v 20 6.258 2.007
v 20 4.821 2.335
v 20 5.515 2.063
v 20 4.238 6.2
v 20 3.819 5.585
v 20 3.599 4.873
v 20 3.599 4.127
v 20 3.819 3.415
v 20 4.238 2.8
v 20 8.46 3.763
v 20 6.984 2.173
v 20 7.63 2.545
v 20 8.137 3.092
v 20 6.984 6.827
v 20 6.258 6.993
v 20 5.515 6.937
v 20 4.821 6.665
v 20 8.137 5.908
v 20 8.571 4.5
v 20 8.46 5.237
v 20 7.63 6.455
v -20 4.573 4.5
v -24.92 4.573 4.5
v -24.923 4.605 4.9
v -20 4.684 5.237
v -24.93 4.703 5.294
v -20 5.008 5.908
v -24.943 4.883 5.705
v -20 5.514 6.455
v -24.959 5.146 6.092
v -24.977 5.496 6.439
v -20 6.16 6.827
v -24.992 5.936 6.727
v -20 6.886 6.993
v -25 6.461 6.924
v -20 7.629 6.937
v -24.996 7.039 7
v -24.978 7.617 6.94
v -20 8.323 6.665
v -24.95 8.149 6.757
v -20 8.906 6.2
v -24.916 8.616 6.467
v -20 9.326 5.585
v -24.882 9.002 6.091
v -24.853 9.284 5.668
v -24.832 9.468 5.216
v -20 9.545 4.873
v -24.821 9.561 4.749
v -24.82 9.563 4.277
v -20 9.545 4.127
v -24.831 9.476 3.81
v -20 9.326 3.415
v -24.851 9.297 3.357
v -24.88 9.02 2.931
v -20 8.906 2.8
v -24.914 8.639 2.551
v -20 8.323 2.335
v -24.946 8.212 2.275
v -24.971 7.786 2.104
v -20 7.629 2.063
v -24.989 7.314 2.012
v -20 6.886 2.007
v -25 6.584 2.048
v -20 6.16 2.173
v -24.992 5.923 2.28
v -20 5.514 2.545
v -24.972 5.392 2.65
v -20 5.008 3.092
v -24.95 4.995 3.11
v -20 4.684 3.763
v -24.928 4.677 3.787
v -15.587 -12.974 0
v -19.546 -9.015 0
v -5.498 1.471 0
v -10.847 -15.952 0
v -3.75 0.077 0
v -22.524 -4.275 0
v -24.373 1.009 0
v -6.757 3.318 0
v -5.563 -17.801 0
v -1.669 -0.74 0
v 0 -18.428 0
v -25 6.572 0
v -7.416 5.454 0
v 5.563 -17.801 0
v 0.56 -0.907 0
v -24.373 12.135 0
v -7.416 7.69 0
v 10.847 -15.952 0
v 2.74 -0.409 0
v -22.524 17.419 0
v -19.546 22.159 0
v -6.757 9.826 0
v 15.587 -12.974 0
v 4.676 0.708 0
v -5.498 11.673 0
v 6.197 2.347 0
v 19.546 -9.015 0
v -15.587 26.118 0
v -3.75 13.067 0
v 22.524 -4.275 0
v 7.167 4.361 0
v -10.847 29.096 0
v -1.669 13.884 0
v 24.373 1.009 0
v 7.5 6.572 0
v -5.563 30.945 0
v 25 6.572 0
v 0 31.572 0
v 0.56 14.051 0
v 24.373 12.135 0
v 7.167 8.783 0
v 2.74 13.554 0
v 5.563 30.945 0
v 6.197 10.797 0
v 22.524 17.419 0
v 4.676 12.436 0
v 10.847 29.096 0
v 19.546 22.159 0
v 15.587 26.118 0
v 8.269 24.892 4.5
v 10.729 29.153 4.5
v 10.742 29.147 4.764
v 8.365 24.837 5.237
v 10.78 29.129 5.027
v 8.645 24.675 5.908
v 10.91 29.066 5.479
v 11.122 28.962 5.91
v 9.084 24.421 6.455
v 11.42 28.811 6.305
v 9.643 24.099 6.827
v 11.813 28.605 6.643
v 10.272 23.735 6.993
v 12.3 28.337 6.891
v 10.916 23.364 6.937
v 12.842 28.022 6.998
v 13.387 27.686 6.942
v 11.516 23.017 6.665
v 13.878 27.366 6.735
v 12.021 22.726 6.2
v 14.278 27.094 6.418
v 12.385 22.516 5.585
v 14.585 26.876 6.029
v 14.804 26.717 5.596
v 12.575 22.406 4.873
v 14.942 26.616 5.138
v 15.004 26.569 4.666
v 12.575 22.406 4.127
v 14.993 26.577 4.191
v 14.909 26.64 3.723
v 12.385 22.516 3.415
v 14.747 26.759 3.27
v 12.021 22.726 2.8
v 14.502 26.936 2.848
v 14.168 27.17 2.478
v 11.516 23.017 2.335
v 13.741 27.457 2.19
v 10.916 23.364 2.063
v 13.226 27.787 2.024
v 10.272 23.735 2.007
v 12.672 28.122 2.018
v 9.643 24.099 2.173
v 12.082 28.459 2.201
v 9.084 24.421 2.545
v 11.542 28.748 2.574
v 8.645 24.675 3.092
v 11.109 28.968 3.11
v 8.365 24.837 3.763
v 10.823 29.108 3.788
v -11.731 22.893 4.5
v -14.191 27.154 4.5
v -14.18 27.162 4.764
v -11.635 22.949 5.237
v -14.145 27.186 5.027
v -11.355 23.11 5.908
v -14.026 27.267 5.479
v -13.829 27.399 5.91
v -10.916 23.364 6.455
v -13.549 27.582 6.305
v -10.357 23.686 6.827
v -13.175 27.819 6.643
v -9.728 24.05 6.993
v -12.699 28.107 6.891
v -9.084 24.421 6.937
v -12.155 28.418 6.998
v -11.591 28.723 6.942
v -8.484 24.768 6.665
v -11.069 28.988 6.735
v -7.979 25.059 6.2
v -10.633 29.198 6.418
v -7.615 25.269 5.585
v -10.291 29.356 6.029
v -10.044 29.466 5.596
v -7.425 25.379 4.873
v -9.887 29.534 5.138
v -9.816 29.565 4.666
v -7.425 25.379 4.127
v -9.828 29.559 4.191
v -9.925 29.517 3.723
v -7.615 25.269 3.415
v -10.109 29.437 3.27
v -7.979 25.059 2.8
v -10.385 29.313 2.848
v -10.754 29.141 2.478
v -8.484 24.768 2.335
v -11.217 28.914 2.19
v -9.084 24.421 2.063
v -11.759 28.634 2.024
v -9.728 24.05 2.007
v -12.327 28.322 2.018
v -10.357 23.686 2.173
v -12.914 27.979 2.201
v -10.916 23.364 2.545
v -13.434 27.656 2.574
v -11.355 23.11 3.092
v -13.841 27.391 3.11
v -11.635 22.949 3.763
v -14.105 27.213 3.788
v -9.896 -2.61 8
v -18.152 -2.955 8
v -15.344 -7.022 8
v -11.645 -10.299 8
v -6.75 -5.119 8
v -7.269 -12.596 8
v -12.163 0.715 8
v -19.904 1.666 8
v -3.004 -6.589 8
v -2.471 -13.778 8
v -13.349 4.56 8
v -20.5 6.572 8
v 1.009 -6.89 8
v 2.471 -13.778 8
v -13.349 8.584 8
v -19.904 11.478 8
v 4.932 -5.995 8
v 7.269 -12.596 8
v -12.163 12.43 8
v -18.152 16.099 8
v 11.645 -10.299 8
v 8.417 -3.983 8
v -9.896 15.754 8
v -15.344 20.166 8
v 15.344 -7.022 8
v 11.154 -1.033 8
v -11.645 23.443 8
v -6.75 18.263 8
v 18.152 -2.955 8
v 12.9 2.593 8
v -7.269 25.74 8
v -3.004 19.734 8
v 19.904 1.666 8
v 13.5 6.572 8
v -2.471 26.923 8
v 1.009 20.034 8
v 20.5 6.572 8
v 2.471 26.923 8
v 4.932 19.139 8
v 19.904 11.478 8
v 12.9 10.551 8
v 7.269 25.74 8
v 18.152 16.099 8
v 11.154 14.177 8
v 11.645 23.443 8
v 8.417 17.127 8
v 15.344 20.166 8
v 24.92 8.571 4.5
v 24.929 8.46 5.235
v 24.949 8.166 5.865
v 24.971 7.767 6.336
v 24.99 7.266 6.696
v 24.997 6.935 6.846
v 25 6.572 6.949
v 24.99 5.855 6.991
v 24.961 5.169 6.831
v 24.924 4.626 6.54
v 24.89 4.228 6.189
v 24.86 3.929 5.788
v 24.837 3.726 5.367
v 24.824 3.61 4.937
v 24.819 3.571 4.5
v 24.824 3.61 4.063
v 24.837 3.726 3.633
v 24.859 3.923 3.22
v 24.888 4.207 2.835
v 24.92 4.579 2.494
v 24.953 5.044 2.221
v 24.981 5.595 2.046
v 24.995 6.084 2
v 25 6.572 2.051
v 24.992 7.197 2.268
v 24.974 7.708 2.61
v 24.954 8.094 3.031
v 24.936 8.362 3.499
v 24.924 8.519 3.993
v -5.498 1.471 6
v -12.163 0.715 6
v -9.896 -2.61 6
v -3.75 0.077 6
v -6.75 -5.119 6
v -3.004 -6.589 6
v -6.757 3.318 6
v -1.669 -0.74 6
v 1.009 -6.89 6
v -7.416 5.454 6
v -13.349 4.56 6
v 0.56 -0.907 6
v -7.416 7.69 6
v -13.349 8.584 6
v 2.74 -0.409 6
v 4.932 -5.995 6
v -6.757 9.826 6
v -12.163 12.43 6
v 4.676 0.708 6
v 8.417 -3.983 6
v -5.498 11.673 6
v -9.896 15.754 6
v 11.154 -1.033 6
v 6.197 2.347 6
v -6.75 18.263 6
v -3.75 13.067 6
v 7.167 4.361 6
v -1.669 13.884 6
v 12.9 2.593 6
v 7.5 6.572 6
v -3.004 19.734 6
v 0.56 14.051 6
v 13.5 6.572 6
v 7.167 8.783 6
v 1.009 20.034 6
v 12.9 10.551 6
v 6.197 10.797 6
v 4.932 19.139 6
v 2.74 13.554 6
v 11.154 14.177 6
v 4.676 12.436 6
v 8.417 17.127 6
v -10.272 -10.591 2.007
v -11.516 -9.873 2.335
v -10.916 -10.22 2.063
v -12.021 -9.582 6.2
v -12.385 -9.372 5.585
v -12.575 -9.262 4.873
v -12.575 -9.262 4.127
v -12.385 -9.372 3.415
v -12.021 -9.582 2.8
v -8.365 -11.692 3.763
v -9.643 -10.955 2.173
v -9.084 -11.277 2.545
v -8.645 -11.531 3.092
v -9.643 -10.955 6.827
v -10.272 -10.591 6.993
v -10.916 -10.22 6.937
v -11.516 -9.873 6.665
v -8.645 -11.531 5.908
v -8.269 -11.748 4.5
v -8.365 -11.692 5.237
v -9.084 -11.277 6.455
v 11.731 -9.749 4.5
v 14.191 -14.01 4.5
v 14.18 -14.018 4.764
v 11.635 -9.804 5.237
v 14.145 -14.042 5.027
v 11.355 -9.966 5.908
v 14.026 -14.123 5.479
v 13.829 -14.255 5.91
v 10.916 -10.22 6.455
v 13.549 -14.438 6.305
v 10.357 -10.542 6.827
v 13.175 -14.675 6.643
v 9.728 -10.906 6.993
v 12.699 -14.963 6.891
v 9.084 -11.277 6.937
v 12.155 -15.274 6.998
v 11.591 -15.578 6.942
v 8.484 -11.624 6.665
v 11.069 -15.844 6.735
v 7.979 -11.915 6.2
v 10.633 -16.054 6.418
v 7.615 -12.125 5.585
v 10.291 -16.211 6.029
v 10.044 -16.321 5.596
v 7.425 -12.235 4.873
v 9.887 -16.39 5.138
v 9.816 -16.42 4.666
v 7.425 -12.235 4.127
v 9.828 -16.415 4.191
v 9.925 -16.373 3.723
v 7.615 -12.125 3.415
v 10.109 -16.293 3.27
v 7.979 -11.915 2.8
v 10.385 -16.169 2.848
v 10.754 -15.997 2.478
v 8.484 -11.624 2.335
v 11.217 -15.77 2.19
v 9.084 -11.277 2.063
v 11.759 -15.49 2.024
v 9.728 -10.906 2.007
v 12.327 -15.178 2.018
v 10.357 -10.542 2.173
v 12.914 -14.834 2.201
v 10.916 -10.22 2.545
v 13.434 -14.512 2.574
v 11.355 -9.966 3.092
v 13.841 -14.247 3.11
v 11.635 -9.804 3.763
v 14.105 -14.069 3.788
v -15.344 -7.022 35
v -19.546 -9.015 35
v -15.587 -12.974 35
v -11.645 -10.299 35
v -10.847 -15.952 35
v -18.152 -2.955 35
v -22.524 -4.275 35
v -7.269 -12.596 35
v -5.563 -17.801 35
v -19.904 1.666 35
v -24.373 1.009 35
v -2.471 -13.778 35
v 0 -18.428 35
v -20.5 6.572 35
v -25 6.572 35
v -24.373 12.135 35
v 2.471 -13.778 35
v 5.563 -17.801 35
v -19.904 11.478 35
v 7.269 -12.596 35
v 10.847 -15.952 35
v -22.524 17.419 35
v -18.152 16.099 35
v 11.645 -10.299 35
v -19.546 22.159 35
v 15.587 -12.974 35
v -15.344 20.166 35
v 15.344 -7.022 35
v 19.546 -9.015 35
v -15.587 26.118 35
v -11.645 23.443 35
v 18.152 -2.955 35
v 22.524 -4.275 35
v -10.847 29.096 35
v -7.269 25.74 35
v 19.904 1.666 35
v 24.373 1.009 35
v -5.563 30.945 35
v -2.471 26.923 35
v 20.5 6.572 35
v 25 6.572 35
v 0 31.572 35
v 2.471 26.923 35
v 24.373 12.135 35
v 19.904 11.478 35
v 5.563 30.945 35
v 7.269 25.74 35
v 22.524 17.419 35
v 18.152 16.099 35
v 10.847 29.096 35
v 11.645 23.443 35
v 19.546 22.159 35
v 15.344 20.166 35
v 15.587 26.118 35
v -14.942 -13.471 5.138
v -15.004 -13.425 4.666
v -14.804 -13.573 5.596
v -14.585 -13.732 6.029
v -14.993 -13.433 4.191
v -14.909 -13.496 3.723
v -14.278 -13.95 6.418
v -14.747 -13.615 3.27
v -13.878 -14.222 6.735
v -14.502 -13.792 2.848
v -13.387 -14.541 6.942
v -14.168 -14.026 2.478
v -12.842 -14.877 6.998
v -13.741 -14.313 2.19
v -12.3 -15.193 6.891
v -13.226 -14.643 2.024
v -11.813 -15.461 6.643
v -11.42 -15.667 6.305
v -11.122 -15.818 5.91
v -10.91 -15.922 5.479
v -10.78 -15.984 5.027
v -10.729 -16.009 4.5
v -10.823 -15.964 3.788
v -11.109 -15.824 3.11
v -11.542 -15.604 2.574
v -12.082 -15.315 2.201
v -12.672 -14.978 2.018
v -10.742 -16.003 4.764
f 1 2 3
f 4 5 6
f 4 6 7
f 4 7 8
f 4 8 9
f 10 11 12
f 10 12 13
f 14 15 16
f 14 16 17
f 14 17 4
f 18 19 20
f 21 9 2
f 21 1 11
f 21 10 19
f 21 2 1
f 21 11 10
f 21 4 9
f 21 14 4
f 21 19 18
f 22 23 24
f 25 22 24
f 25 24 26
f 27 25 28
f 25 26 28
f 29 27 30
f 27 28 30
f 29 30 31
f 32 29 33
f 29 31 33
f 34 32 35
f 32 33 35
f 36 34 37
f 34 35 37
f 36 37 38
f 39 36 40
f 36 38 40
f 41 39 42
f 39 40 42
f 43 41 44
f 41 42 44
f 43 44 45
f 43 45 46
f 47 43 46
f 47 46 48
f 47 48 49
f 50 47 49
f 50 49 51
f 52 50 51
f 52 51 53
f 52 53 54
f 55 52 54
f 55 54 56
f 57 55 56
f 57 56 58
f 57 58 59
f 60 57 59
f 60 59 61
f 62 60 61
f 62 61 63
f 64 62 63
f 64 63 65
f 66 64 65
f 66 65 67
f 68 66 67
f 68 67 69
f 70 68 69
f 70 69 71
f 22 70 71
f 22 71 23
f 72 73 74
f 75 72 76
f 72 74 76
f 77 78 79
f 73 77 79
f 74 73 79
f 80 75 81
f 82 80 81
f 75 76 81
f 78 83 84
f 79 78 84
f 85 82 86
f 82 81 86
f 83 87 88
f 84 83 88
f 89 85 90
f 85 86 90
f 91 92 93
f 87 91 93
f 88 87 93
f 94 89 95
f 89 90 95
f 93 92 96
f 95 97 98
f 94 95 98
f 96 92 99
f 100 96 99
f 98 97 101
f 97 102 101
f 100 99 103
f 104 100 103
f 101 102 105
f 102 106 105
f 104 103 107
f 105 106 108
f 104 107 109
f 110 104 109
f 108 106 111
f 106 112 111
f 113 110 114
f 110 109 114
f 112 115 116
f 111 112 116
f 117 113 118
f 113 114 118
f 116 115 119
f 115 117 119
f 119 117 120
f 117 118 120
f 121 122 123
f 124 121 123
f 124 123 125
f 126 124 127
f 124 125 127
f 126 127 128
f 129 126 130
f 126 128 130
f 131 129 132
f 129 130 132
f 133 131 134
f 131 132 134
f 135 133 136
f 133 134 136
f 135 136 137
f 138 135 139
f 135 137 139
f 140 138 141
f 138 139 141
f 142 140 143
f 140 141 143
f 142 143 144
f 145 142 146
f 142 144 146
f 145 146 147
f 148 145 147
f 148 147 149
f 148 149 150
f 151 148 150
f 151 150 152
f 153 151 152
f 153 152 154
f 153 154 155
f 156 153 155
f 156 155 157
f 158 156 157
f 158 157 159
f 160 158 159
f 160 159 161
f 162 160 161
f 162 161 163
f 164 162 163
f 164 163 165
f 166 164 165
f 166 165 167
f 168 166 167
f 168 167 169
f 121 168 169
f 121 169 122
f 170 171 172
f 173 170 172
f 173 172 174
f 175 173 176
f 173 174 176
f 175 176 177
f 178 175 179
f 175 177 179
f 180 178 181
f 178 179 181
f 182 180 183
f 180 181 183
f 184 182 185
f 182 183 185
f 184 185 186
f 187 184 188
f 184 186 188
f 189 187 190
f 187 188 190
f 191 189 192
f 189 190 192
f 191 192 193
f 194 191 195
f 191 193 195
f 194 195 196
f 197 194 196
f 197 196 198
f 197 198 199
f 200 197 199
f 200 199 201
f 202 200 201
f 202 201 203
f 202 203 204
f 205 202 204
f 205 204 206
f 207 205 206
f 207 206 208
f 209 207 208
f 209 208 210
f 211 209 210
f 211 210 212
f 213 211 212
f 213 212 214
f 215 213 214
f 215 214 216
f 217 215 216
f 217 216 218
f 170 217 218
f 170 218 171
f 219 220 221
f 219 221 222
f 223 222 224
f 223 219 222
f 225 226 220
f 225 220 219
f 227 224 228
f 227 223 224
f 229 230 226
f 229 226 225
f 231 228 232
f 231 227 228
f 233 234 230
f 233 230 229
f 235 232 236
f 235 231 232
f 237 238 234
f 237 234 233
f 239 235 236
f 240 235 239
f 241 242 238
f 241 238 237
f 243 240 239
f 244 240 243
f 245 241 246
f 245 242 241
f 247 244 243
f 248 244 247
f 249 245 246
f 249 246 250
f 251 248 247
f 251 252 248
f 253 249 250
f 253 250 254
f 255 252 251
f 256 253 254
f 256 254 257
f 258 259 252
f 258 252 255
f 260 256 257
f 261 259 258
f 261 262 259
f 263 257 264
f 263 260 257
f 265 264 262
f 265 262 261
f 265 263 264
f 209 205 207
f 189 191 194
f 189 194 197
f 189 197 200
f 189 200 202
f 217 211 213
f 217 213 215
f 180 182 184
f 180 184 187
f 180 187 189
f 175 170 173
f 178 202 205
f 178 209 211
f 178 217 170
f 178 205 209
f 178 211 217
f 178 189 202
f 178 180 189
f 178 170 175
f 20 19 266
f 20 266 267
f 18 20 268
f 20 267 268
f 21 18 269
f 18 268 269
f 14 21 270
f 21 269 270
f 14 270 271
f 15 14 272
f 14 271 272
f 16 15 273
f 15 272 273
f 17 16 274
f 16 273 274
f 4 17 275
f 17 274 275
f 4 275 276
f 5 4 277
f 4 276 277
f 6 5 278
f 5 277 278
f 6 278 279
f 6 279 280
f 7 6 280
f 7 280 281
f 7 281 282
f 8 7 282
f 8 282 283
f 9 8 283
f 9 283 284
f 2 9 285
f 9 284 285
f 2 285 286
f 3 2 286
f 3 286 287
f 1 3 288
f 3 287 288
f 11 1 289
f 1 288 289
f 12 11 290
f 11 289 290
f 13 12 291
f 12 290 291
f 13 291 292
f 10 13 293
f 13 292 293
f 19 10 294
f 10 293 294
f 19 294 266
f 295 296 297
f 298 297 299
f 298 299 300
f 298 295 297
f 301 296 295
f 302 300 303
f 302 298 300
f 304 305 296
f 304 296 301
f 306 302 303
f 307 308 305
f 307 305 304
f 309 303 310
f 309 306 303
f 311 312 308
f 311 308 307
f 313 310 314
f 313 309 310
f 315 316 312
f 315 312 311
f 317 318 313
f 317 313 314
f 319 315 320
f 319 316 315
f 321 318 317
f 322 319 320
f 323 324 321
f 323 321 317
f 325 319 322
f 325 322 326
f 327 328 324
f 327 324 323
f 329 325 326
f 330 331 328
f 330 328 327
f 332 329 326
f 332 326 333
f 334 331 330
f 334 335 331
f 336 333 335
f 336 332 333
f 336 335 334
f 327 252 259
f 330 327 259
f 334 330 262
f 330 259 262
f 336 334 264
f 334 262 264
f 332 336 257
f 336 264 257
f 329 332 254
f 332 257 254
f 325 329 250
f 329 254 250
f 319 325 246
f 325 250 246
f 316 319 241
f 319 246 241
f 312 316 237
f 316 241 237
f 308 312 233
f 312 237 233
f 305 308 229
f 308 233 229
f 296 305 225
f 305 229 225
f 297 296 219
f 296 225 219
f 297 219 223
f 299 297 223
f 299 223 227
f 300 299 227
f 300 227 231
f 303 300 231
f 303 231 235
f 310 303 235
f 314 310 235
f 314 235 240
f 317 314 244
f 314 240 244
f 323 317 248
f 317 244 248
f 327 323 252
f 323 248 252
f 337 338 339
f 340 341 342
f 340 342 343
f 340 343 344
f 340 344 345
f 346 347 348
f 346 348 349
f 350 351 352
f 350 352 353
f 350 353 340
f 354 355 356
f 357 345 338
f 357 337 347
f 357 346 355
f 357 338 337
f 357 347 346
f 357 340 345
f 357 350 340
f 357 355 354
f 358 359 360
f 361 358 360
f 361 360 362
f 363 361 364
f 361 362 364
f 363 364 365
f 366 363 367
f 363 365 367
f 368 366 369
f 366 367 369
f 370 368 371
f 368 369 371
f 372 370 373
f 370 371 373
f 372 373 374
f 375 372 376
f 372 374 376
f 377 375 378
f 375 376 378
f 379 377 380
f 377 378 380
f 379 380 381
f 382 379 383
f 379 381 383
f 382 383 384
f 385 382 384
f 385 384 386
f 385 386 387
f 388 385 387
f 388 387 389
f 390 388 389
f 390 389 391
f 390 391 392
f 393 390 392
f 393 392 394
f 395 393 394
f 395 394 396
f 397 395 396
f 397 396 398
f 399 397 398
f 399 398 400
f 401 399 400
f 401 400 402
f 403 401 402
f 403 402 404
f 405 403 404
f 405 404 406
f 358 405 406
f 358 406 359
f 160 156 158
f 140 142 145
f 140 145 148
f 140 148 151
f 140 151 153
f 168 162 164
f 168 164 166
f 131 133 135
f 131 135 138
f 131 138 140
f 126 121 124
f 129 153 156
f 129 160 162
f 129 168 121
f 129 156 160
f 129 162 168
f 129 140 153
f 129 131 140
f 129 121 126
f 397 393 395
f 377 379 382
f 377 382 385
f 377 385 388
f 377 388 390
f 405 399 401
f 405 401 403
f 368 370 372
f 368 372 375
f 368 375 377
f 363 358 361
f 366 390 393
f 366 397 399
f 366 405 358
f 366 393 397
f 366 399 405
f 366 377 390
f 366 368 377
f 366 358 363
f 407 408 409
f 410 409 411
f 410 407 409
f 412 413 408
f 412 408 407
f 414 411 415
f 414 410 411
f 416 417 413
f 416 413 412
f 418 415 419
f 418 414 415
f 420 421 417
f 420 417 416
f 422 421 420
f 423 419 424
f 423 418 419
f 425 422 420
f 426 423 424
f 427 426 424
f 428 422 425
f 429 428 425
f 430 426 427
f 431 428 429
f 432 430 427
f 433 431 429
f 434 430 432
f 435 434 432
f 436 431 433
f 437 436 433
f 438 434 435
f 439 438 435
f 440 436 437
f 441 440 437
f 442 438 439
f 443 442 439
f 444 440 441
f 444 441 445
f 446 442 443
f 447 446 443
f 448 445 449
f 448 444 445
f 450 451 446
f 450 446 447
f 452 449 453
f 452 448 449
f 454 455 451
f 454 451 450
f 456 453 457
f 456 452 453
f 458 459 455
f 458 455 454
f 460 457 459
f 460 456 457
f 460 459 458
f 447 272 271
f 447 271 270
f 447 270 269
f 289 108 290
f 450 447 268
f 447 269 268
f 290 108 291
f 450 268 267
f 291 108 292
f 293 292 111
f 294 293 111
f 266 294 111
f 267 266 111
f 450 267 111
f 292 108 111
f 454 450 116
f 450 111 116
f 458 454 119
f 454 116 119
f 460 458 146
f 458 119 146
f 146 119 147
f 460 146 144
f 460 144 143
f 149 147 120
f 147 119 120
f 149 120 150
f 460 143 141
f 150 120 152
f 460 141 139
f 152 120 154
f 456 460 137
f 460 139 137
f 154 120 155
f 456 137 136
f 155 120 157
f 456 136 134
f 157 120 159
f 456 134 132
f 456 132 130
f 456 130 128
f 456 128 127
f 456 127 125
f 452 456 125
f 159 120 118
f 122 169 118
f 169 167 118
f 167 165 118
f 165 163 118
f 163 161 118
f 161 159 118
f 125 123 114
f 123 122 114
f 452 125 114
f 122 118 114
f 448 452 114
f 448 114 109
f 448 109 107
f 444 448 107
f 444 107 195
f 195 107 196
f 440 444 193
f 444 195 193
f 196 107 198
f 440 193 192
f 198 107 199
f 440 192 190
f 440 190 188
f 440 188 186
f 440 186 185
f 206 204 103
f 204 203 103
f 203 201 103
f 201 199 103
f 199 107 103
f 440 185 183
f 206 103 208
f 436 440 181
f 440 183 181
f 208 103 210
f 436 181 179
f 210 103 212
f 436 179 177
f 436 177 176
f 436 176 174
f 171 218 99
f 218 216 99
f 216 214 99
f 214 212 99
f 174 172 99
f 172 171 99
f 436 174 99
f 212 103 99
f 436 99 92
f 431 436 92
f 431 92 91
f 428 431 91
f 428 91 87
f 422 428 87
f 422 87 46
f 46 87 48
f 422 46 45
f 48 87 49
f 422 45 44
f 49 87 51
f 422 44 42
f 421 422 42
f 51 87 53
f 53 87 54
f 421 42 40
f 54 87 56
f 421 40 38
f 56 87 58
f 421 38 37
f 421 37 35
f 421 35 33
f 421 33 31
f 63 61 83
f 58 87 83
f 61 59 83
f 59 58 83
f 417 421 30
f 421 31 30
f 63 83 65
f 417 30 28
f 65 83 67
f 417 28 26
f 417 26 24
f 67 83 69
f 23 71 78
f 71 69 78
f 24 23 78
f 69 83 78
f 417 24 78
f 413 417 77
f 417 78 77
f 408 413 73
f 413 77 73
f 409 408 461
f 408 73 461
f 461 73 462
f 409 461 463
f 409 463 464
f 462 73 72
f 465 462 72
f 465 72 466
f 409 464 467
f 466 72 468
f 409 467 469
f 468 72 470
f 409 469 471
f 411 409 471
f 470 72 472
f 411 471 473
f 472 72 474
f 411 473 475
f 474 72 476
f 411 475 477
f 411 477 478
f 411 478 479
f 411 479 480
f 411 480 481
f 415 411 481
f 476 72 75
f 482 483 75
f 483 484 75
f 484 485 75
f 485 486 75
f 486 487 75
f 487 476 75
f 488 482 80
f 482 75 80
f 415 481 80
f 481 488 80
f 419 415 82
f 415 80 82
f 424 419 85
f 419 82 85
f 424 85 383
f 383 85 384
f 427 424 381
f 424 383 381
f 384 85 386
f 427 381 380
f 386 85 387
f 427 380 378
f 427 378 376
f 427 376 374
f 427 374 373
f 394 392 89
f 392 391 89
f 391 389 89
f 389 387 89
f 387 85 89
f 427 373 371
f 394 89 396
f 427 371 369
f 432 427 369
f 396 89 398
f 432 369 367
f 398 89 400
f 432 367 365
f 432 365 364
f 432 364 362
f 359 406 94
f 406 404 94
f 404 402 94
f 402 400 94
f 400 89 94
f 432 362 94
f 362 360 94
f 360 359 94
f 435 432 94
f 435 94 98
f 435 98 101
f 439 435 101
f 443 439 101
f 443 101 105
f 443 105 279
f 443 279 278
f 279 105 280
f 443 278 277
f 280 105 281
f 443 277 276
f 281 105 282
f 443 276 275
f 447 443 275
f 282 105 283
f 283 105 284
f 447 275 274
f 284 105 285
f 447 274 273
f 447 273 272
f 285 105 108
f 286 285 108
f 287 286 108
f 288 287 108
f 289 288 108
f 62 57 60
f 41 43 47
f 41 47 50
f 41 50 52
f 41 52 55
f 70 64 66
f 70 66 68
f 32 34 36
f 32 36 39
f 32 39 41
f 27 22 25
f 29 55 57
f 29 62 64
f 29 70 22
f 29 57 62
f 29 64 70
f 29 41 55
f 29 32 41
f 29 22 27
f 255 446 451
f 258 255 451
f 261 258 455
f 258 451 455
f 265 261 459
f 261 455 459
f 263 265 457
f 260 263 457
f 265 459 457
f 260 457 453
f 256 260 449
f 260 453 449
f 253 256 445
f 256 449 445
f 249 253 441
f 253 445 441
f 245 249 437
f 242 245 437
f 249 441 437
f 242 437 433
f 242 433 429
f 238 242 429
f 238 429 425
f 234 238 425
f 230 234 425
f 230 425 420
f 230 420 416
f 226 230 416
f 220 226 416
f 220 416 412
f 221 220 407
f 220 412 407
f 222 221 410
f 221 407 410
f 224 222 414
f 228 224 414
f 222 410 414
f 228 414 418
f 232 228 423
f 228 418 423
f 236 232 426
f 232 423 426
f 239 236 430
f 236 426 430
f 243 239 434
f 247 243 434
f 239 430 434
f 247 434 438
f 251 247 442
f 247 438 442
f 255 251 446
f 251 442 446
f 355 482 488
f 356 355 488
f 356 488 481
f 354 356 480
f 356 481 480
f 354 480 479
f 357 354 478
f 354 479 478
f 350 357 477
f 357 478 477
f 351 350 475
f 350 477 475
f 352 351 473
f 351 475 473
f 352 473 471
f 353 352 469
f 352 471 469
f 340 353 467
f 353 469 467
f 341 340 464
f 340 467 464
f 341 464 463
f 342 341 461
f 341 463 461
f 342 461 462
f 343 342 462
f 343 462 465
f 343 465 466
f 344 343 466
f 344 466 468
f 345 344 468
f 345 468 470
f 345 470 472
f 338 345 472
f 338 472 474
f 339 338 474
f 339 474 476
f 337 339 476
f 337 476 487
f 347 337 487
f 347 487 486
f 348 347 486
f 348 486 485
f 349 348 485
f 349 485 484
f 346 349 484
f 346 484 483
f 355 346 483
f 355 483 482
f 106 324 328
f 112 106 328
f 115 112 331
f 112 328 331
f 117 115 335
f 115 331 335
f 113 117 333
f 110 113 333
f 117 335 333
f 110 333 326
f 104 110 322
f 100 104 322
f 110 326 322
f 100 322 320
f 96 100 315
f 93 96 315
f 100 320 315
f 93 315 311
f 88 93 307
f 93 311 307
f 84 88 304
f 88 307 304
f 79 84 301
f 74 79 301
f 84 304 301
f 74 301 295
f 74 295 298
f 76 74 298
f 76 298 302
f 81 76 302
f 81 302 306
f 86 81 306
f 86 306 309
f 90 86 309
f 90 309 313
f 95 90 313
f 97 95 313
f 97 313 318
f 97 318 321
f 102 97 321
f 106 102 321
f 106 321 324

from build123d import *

# Parameters (mm, degrees)
F0_R             = 25
F1_DEPTH         = 35
F2_R             = 20.5
F3_DEPTH         = 27
F4_R             = 7.5
F5_DEPTH         = 8.001
F6_R             = 13.5
F7_DEPTH         = 2
F10_R            = 2.5
F11_DEPTH        = 5
F11_COPIES_COUNT = 6


# Not quite as in the source:
# - a pattern or mirror of a feature is missing from the dataset's text; its kind, count and spacing are read off the source's solid


with BuildPart() as f1:
    # F0 (on Top) → F1 (new body)
    with BuildSketch(Plane.XY):
        with Locations((0, 6.5720938146)):
            Circle(F0_R)
    extrude(amount=F1_DEPTH)

    # F2 (on face) → F3 (cut)
    with BuildSketch(Plane.XY.offset(35)):
        with Locations((0, 6.5720938146)):
            Circle(F2_R)
    extrude(amount=-F3_DEPTH, mode=Mode.SUBTRACT)

    # F4 (on face) → F5 (cut, through all)
    with BuildSketch(Plane.XY.offset(8)):
        with Locations((0, 6.5720938146)):
            Circle(F4_R)
    extrude(amount=-F5_DEPTH, mode=Mode.SUBTRACT)

    # F6 (on face) → F7 (cut)
    with BuildSketch(Plane.XY.offset(8)):
        with Locations((0, 6.5720938146)):
            Circle(F6_R)
    extrude(amount=-F7_DEPTH, mode=Mode.SUBTRACT)

    # F10 (on offset) → F11 (cut)
    with BuildSketch(Plane.YZ.offset(25)):
        with Locations((6.071, 4.5)):
            Circle(F10_R)
    f11 = extrude(amount=-F11_DEPTH, mode=Mode.SUBTRACT)

    # F11_copies: F11 ×6 about axis
    f11_copies_axis = Axis((0, 6.572094, 0), (0, 0, 1))
    for i in range(1, F11_COPIES_COUNT):
        add(f11.rotate(f11_copies_axis, i * 360 / F11_COPIES_COUNT), mode=Mode.SUBTRACT)


solid = f1.part
